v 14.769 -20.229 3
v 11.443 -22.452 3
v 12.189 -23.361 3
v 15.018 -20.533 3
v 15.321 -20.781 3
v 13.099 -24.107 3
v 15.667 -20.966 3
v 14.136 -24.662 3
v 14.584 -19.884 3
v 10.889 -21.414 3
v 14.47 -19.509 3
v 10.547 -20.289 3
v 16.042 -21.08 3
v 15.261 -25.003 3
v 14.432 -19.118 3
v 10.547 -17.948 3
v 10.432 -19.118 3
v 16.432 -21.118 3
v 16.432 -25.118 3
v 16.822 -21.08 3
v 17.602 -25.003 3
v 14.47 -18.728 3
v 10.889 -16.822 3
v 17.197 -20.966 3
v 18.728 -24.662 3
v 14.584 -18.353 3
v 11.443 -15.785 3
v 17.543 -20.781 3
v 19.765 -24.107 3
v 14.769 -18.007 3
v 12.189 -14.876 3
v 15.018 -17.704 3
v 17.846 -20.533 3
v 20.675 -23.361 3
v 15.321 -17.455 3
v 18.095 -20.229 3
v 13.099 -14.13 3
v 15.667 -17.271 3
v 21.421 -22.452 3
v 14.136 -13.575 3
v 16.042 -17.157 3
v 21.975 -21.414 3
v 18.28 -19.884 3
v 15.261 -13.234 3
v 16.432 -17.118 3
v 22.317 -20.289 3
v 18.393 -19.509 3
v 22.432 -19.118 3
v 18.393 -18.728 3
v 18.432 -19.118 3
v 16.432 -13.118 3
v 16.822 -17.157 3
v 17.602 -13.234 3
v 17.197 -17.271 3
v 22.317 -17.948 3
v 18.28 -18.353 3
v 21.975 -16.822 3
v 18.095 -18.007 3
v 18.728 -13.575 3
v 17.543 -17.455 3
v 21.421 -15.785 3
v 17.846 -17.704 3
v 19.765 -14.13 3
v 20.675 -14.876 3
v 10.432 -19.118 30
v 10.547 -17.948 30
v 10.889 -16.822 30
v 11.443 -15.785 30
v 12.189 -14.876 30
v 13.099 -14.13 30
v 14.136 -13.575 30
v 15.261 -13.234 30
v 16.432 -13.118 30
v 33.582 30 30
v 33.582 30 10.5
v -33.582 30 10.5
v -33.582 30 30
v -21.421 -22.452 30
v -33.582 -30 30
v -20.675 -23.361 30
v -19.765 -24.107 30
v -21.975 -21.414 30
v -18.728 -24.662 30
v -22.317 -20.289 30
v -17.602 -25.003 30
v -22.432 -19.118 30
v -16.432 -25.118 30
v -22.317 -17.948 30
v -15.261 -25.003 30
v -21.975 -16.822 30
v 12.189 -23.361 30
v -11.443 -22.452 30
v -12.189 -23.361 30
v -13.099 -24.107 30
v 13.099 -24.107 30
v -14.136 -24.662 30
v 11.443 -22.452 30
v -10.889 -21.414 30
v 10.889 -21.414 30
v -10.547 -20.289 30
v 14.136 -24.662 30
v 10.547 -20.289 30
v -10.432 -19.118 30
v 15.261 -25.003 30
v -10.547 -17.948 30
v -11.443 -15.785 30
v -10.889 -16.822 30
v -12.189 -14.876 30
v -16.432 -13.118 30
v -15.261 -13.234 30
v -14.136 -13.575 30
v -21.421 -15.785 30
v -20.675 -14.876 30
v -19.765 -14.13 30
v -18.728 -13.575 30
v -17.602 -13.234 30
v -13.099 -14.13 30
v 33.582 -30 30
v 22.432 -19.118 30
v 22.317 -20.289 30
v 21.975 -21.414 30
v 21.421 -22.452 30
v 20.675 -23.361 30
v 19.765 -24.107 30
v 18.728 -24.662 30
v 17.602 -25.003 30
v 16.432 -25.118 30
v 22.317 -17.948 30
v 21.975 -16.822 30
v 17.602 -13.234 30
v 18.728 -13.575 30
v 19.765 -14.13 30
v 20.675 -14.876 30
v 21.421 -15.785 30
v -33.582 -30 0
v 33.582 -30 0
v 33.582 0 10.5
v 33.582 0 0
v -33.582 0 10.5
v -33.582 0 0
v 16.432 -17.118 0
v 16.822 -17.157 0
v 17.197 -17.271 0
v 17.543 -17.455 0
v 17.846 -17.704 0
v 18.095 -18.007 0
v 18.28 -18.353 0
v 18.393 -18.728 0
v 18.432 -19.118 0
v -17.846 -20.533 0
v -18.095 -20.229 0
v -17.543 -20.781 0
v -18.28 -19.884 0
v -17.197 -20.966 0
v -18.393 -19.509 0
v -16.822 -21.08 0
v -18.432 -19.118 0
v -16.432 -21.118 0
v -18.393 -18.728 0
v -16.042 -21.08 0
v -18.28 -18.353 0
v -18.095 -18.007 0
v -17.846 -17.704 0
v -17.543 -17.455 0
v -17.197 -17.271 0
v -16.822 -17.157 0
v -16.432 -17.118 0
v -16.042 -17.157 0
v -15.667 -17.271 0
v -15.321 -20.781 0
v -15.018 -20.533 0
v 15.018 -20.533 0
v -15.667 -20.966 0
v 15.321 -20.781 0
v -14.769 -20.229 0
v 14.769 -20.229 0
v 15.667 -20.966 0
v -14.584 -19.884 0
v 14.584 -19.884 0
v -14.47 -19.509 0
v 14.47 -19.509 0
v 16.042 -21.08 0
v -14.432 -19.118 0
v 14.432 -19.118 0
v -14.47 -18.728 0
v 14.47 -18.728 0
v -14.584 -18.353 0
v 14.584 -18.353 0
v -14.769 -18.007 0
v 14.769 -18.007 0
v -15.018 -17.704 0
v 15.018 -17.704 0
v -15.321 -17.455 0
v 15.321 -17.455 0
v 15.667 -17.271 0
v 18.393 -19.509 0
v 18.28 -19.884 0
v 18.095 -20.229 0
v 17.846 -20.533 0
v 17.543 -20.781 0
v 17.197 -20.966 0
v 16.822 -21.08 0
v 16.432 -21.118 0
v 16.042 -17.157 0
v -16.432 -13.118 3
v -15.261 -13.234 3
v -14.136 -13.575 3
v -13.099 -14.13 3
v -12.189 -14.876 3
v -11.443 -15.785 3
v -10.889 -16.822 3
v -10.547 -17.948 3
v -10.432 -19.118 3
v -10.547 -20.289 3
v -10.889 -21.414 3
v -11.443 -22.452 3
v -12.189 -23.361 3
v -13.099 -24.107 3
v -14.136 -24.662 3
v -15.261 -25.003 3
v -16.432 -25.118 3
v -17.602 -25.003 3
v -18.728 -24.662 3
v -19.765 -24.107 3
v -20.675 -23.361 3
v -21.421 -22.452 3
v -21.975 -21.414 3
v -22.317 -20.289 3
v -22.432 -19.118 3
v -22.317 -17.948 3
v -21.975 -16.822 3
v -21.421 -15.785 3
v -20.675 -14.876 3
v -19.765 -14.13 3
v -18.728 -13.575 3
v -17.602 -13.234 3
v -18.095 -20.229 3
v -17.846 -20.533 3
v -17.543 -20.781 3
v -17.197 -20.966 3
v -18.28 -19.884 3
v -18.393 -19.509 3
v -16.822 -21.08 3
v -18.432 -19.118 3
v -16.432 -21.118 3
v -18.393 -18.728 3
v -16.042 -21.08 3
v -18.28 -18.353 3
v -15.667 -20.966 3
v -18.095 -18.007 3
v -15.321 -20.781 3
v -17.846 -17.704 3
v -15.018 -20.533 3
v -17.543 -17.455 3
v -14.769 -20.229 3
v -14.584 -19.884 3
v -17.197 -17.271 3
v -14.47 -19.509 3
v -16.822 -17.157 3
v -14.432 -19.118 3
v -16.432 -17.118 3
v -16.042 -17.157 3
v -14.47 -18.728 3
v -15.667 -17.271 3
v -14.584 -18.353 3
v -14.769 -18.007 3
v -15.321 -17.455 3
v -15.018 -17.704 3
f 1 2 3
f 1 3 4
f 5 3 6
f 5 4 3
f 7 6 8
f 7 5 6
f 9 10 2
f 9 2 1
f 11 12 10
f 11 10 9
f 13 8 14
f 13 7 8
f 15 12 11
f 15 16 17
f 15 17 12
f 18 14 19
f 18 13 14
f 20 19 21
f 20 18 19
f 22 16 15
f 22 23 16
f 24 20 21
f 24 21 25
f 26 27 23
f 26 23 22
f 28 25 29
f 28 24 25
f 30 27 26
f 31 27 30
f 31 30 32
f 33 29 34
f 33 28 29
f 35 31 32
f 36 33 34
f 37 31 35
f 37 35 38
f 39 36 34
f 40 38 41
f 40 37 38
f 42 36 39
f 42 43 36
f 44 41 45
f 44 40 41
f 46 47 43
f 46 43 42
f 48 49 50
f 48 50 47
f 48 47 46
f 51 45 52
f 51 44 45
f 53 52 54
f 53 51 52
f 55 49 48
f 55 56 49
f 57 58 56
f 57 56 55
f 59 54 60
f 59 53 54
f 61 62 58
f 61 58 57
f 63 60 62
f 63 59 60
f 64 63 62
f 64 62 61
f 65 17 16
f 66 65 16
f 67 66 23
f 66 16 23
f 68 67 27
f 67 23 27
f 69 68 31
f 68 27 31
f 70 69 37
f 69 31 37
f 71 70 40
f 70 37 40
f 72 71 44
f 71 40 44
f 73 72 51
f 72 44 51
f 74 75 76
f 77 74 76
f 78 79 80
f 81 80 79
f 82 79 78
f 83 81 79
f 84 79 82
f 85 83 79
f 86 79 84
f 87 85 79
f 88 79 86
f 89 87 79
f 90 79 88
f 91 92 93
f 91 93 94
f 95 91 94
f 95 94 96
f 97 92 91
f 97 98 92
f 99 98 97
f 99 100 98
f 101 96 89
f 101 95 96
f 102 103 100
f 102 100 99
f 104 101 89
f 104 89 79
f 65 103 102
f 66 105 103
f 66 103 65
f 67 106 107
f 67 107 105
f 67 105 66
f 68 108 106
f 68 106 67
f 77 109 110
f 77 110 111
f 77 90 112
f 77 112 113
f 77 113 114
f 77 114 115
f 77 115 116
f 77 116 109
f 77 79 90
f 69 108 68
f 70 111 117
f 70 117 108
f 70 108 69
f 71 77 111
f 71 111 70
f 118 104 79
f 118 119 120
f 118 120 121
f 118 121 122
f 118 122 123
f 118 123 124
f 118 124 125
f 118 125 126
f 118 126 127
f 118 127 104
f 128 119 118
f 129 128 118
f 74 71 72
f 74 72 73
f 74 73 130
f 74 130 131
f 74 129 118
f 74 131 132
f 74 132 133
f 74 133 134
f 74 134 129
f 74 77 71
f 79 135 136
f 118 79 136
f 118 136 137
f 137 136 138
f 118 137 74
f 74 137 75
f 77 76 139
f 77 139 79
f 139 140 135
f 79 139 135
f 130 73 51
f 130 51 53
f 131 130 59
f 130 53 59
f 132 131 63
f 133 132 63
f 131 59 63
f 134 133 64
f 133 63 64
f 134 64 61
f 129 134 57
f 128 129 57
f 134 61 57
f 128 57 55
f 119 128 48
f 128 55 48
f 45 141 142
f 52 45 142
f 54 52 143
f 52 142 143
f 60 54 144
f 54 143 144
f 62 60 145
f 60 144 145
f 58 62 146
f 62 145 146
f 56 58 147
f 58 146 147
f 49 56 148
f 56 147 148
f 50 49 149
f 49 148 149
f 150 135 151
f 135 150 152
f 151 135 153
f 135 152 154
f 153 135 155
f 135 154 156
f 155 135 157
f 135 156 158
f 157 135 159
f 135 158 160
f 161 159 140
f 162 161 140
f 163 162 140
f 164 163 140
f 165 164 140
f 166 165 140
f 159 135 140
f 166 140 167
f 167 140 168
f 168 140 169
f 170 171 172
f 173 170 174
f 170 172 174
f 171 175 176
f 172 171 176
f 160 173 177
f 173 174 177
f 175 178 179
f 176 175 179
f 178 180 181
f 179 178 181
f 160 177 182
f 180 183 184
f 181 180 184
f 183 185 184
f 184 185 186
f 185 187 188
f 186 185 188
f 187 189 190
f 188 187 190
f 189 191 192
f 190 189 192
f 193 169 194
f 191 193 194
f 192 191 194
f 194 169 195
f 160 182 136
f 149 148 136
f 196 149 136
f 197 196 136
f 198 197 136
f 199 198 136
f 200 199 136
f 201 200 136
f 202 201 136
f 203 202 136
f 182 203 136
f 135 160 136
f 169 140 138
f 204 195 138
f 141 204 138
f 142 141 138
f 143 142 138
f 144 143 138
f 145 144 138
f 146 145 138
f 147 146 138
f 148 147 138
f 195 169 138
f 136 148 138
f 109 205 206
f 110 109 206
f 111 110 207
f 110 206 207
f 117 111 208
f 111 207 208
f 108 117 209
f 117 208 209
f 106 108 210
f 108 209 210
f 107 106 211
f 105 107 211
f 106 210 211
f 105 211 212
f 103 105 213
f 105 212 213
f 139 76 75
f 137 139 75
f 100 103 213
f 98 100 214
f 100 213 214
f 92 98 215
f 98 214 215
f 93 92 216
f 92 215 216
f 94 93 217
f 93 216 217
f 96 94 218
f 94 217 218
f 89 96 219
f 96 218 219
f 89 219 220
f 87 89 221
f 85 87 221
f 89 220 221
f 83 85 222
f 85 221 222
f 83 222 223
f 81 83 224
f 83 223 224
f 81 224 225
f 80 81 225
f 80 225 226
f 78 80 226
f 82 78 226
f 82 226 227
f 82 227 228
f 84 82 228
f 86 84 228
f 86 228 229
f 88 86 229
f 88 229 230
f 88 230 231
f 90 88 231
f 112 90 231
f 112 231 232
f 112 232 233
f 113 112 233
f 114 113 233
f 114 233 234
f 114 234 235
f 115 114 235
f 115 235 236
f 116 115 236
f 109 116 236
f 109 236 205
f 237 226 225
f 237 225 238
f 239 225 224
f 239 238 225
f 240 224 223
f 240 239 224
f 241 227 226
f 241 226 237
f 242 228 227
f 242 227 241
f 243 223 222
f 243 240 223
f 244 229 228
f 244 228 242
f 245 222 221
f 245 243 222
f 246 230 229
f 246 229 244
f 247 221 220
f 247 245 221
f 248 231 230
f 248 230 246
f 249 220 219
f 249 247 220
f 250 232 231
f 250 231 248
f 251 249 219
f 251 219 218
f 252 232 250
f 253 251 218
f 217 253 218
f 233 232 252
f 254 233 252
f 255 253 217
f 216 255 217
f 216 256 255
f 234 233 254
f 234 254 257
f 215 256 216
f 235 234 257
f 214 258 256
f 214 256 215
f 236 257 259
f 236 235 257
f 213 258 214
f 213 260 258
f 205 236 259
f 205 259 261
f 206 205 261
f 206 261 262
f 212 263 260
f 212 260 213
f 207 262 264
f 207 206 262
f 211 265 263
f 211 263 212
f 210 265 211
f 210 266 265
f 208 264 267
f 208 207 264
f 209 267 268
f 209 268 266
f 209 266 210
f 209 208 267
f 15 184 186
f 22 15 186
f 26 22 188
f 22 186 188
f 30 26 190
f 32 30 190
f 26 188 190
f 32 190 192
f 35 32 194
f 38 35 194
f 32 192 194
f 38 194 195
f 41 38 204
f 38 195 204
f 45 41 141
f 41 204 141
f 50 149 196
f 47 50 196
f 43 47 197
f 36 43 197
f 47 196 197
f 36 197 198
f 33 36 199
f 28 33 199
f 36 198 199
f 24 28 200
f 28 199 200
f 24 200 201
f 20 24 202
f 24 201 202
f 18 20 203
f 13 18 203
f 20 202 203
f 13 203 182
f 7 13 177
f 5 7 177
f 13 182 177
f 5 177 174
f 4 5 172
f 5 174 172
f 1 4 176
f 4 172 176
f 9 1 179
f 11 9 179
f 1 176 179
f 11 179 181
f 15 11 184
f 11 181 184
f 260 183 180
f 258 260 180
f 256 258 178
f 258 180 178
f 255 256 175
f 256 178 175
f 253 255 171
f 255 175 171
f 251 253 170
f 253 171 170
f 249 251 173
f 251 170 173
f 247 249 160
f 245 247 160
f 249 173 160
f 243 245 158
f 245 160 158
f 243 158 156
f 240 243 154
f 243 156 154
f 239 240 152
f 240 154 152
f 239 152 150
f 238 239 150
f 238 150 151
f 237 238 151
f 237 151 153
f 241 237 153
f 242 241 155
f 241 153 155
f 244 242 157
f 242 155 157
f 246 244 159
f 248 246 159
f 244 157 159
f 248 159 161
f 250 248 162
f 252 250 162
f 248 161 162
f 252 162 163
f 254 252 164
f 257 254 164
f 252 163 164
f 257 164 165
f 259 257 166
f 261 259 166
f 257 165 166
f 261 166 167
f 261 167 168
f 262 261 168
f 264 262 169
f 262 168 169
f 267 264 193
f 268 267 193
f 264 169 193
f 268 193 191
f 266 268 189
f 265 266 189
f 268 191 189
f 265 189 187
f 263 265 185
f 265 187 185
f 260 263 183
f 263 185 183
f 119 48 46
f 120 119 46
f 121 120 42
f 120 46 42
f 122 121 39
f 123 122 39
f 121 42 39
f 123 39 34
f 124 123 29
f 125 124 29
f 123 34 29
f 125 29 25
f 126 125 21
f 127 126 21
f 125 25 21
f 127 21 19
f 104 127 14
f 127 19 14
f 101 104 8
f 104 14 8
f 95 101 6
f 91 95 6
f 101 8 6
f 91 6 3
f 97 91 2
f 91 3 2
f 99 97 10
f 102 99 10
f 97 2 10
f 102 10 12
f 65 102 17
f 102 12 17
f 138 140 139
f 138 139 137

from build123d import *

# Parameters (mm, degrees)
F0_W     = 32.8638516366
F0_H     = 19.1183499992
F1_DEPTH = 30
F2_DEPTH = 30
F3_DEPTH = 3
F4_DEPTH = 10.5


with BuildPart() as f1:
    # F0 (on Top) → F1 (new body)
    with BuildSketch(Plane.XY):
        Polygon((33.5817799435, 0), (33.5817799435, 30), (-33.5817799435, 30), (-33.5817799435, 0), (-16.4319258183, 0), (-16.4319258183, 19.1183499992), (16.4319258183, 19.1183499992), (16.4319258183, 0), align=None)
        with Locations((0, 9.5591749996)):
            Rectangle(F0_W, F0_H)
    extrude(amount=F1_DEPTH)

    # F0 (on Top) → F2 (join)
    with BuildSketch(Plane.XY):
        with BuildLine():
            Line((16.4319258183, -13.1183499992), (16.4319258183, 0))
            Line((16.4319258183, 0), (-16.4319258183, 0))
            Line((-16.4319258183, 0), (-16.4319258183, -13.1183499992))
            ThreePointArc((-16.4319258183, -13.1183499992), (-12.1892851312, -14.8757093121), (-10.4319258183, -19.1183499992))
            Line((-10.4319258183, -19.1183499992), (10.4319258183, -19.1183499992))
            ThreePointArc((10.4319258183, -19.1183499992), (12.1892851312, -14.8757093121), (16.4319258183, -13.1183499992))
        make_face()
        with BuildLine():
            Line((33.5817799435, -30), (33.5817799435, 0))
            Line((33.5817799435, 0), (16.4319258183, 0))
            Line((16.4319258183, 0), (16.4319258183, -13.1183499992))
            ThreePointArc((16.4319258183, -13.1183499992), (20.6745665054, -14.8757093121), (22.4319258183, -19.1183499992))
            ThreePointArc((22.4319258183, -19.1183499992), (16.4319258183, -25.1183499992), (10.4319258183, -19.1183499992))
            Line((10.4319258183, -19.1183499992), (-10.4319258183, -19.1183499992))
            ThreePointArc((-10.4319258183, -19.1183499992), (-20.6745665054, -23.3609906863), (-16.4319258183, -13.1183499992))
            Line((-16.4319258183, -13.1183499992), (-16.4319258183, 0))
            Line((-16.4319258183, 0), (-33.5817799435, 0))
            Line((-33.5817799435, 0), (-33.5817799435, -30))
            Line((-33.5817799435, -30), (33.5817799435, -30))
        make_face()
    extrude(amount=F2_DEPTH)

    # F0 (on Top) → F3 (join)
    with BuildSketch(Plane.XY):
        with BuildLine():
            Line((-16.4319258183, -17.1183499992), (-16.4319258183, -13.1183499992))
            ThreePointArc((-16.4319258183, -13.1183499992), (-20.6745665054, -23.3609906863), (-10.4319258183, -19.1183499992))
            Line((-10.4319258183, -19.1183499992), (-14.4319258183, -19.1183499992))
            ThreePointArc((-14.4319258183, -19.1183499992), (-17.8461393807, -20.5325635616), (-16.4319258183, -17.1183499992))
        make_face()
        with BuildLine():
            ThreePointArc((-10.4319258183, -19.1183499992), (-12.1892851312, -14.8757093121), (-16.4319258183, -13.1183499992))
            Line((-16.4319258183, -13.1183499992), (-16.4319258183, -17.1183499992))
            ThreePointArc((-16.4319258183, -17.1183499992), (-15.017712256, -17.7041364368), (-14.4319258183, -19.1183499992))
            Line((-14.4319258183, -19.1183499992), (-10.4319258183, -19.1183499992))
        make_face()
        with BuildLine():
            Line((16.4319258183, -17.1183499992), (16.4319258183, -13.1183499992))
            ThreePointArc((16.4319258183, -13.1183499992), (12.1892851312, -14.8757093121), (10.4319258183, -19.1183499992))
            Line((10.4319258183, -19.1183499992), (14.4319258183, -19.1183499992))
            ThreePointArc((14.4319258183, -19.1183499992), (15.017712256, -17.7041364368), (16.4319258183, -17.1183499992))
        make_face()
        with BuildLine():
            ThreePointArc((22.4319258183, -19.1183499992), (20.6745665054, -14.8757093121), (16.4319258183, -13.1183499992))
            Line((16.4319258183, -13.1183499992), (16.4319258183, -17.1183499992))
            ThreePointArc((16.4319258183, -17.1183499992), (17.8461393807, -17.7041364368), (18.4319258183, -19.1183499992))
            ThreePointArc((18.4319258183, -19.1183499992), (16.4319258183, -21.1183499992), (14.4319258183, -19.1183499992))
            Line((14.4319258183, -19.1183499992), (10.4319258183, -19.1183499992))
            ThreePointArc((10.4319258183, -19.1183499992), (16.4319258183, -25.1183499992), (22.4319258183, -19.1183499992))
        make_face()
    extrude(amount=F3_DEPTH)

    # F0 (on Top) → F4 (cut)
    with BuildSketch(Plane.XY):
        Polygon((33.5817799435, 0), (33.5817799435, 30), (-33.5817799435, 30), (-33.5817799435, 0), (-16.4319258183, 0), (-16.4319258183, 19.1183499992), (16.4319258183, 19.1183499992), (16.4319258183, 0), align=None)
        with Locations((0, 9.5591749996)):
            Rectangle(F0_W, F0_H)
    extrude(amount=F4_DEPTH, mode=Mode.SUBTRACT)


solid = f1.part
